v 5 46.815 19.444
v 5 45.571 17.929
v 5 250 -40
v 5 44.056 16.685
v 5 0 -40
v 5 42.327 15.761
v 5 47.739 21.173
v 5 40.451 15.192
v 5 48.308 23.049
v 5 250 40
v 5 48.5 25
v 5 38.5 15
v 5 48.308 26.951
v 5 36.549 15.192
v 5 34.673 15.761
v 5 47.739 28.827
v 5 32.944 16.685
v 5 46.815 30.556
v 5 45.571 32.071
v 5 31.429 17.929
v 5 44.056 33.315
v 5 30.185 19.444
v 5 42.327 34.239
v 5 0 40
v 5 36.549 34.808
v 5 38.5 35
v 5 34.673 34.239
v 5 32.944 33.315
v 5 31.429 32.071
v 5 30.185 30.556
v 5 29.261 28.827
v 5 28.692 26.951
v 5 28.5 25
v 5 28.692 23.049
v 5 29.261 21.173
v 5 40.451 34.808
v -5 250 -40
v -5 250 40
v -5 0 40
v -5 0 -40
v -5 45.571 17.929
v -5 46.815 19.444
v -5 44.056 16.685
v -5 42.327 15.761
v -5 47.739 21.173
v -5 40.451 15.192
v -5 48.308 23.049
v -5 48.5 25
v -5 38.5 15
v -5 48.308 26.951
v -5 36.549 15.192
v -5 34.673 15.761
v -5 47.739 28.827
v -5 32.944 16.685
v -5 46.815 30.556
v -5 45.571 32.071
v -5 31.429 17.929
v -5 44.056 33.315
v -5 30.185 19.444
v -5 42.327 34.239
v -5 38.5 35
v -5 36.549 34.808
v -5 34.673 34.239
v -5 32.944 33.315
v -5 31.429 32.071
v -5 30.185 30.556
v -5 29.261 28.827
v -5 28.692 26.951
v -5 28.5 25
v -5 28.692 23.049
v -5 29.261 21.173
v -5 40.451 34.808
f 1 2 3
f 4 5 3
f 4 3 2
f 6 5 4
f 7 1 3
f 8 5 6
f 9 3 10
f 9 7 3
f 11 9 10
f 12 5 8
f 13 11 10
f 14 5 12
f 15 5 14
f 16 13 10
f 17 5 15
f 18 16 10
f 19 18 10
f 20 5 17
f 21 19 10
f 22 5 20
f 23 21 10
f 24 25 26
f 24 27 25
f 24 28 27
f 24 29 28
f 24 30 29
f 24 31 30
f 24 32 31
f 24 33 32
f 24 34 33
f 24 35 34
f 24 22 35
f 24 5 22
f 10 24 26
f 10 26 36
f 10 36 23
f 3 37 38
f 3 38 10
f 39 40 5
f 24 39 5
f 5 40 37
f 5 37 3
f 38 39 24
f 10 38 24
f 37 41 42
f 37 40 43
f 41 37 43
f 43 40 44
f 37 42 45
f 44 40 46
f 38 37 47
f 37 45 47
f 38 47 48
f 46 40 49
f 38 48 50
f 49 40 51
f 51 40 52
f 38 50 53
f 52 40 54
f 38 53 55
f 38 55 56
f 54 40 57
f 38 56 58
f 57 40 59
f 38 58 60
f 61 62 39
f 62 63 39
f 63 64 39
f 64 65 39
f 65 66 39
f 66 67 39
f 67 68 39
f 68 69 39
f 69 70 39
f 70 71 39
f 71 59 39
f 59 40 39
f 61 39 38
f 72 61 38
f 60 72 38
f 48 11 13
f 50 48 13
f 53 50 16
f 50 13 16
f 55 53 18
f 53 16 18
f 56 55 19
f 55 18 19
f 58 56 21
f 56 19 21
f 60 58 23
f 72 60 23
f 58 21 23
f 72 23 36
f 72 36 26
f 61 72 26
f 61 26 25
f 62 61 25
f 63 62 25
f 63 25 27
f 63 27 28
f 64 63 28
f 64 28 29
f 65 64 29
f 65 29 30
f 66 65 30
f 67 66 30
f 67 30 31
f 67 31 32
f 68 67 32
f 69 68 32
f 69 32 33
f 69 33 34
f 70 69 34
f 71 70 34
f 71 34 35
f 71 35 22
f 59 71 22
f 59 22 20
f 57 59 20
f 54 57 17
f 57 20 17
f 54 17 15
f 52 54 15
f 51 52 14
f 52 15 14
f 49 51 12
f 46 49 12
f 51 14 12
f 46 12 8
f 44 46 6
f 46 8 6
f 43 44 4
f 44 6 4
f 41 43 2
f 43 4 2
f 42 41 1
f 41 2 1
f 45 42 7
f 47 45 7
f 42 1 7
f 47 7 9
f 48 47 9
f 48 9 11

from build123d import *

# Parameters (mm, degrees)
F0_W     = 10
F0_H     = 80
F1_DEPTH = 250
F2_R     = 10
F3_DEPTH = 10.001


with BuildPart() as f1:
    # F0 (on Front) → F1 (new body)
    with BuildSketch(Plane.XZ):
        Rectangle(F0_W, F0_H)
    extrude(amount=-F1_DEPTH)

    # F2 (on face) → F3 (cut, through all)
    with BuildSketch(Plane.YZ.offset(5)):
        with Locations((38.5, 25)):
            Circle(F2_R)
    extrude(amount=-F3_DEPTH, mode=Mode.SUBTRACT)


solid = f1.part
